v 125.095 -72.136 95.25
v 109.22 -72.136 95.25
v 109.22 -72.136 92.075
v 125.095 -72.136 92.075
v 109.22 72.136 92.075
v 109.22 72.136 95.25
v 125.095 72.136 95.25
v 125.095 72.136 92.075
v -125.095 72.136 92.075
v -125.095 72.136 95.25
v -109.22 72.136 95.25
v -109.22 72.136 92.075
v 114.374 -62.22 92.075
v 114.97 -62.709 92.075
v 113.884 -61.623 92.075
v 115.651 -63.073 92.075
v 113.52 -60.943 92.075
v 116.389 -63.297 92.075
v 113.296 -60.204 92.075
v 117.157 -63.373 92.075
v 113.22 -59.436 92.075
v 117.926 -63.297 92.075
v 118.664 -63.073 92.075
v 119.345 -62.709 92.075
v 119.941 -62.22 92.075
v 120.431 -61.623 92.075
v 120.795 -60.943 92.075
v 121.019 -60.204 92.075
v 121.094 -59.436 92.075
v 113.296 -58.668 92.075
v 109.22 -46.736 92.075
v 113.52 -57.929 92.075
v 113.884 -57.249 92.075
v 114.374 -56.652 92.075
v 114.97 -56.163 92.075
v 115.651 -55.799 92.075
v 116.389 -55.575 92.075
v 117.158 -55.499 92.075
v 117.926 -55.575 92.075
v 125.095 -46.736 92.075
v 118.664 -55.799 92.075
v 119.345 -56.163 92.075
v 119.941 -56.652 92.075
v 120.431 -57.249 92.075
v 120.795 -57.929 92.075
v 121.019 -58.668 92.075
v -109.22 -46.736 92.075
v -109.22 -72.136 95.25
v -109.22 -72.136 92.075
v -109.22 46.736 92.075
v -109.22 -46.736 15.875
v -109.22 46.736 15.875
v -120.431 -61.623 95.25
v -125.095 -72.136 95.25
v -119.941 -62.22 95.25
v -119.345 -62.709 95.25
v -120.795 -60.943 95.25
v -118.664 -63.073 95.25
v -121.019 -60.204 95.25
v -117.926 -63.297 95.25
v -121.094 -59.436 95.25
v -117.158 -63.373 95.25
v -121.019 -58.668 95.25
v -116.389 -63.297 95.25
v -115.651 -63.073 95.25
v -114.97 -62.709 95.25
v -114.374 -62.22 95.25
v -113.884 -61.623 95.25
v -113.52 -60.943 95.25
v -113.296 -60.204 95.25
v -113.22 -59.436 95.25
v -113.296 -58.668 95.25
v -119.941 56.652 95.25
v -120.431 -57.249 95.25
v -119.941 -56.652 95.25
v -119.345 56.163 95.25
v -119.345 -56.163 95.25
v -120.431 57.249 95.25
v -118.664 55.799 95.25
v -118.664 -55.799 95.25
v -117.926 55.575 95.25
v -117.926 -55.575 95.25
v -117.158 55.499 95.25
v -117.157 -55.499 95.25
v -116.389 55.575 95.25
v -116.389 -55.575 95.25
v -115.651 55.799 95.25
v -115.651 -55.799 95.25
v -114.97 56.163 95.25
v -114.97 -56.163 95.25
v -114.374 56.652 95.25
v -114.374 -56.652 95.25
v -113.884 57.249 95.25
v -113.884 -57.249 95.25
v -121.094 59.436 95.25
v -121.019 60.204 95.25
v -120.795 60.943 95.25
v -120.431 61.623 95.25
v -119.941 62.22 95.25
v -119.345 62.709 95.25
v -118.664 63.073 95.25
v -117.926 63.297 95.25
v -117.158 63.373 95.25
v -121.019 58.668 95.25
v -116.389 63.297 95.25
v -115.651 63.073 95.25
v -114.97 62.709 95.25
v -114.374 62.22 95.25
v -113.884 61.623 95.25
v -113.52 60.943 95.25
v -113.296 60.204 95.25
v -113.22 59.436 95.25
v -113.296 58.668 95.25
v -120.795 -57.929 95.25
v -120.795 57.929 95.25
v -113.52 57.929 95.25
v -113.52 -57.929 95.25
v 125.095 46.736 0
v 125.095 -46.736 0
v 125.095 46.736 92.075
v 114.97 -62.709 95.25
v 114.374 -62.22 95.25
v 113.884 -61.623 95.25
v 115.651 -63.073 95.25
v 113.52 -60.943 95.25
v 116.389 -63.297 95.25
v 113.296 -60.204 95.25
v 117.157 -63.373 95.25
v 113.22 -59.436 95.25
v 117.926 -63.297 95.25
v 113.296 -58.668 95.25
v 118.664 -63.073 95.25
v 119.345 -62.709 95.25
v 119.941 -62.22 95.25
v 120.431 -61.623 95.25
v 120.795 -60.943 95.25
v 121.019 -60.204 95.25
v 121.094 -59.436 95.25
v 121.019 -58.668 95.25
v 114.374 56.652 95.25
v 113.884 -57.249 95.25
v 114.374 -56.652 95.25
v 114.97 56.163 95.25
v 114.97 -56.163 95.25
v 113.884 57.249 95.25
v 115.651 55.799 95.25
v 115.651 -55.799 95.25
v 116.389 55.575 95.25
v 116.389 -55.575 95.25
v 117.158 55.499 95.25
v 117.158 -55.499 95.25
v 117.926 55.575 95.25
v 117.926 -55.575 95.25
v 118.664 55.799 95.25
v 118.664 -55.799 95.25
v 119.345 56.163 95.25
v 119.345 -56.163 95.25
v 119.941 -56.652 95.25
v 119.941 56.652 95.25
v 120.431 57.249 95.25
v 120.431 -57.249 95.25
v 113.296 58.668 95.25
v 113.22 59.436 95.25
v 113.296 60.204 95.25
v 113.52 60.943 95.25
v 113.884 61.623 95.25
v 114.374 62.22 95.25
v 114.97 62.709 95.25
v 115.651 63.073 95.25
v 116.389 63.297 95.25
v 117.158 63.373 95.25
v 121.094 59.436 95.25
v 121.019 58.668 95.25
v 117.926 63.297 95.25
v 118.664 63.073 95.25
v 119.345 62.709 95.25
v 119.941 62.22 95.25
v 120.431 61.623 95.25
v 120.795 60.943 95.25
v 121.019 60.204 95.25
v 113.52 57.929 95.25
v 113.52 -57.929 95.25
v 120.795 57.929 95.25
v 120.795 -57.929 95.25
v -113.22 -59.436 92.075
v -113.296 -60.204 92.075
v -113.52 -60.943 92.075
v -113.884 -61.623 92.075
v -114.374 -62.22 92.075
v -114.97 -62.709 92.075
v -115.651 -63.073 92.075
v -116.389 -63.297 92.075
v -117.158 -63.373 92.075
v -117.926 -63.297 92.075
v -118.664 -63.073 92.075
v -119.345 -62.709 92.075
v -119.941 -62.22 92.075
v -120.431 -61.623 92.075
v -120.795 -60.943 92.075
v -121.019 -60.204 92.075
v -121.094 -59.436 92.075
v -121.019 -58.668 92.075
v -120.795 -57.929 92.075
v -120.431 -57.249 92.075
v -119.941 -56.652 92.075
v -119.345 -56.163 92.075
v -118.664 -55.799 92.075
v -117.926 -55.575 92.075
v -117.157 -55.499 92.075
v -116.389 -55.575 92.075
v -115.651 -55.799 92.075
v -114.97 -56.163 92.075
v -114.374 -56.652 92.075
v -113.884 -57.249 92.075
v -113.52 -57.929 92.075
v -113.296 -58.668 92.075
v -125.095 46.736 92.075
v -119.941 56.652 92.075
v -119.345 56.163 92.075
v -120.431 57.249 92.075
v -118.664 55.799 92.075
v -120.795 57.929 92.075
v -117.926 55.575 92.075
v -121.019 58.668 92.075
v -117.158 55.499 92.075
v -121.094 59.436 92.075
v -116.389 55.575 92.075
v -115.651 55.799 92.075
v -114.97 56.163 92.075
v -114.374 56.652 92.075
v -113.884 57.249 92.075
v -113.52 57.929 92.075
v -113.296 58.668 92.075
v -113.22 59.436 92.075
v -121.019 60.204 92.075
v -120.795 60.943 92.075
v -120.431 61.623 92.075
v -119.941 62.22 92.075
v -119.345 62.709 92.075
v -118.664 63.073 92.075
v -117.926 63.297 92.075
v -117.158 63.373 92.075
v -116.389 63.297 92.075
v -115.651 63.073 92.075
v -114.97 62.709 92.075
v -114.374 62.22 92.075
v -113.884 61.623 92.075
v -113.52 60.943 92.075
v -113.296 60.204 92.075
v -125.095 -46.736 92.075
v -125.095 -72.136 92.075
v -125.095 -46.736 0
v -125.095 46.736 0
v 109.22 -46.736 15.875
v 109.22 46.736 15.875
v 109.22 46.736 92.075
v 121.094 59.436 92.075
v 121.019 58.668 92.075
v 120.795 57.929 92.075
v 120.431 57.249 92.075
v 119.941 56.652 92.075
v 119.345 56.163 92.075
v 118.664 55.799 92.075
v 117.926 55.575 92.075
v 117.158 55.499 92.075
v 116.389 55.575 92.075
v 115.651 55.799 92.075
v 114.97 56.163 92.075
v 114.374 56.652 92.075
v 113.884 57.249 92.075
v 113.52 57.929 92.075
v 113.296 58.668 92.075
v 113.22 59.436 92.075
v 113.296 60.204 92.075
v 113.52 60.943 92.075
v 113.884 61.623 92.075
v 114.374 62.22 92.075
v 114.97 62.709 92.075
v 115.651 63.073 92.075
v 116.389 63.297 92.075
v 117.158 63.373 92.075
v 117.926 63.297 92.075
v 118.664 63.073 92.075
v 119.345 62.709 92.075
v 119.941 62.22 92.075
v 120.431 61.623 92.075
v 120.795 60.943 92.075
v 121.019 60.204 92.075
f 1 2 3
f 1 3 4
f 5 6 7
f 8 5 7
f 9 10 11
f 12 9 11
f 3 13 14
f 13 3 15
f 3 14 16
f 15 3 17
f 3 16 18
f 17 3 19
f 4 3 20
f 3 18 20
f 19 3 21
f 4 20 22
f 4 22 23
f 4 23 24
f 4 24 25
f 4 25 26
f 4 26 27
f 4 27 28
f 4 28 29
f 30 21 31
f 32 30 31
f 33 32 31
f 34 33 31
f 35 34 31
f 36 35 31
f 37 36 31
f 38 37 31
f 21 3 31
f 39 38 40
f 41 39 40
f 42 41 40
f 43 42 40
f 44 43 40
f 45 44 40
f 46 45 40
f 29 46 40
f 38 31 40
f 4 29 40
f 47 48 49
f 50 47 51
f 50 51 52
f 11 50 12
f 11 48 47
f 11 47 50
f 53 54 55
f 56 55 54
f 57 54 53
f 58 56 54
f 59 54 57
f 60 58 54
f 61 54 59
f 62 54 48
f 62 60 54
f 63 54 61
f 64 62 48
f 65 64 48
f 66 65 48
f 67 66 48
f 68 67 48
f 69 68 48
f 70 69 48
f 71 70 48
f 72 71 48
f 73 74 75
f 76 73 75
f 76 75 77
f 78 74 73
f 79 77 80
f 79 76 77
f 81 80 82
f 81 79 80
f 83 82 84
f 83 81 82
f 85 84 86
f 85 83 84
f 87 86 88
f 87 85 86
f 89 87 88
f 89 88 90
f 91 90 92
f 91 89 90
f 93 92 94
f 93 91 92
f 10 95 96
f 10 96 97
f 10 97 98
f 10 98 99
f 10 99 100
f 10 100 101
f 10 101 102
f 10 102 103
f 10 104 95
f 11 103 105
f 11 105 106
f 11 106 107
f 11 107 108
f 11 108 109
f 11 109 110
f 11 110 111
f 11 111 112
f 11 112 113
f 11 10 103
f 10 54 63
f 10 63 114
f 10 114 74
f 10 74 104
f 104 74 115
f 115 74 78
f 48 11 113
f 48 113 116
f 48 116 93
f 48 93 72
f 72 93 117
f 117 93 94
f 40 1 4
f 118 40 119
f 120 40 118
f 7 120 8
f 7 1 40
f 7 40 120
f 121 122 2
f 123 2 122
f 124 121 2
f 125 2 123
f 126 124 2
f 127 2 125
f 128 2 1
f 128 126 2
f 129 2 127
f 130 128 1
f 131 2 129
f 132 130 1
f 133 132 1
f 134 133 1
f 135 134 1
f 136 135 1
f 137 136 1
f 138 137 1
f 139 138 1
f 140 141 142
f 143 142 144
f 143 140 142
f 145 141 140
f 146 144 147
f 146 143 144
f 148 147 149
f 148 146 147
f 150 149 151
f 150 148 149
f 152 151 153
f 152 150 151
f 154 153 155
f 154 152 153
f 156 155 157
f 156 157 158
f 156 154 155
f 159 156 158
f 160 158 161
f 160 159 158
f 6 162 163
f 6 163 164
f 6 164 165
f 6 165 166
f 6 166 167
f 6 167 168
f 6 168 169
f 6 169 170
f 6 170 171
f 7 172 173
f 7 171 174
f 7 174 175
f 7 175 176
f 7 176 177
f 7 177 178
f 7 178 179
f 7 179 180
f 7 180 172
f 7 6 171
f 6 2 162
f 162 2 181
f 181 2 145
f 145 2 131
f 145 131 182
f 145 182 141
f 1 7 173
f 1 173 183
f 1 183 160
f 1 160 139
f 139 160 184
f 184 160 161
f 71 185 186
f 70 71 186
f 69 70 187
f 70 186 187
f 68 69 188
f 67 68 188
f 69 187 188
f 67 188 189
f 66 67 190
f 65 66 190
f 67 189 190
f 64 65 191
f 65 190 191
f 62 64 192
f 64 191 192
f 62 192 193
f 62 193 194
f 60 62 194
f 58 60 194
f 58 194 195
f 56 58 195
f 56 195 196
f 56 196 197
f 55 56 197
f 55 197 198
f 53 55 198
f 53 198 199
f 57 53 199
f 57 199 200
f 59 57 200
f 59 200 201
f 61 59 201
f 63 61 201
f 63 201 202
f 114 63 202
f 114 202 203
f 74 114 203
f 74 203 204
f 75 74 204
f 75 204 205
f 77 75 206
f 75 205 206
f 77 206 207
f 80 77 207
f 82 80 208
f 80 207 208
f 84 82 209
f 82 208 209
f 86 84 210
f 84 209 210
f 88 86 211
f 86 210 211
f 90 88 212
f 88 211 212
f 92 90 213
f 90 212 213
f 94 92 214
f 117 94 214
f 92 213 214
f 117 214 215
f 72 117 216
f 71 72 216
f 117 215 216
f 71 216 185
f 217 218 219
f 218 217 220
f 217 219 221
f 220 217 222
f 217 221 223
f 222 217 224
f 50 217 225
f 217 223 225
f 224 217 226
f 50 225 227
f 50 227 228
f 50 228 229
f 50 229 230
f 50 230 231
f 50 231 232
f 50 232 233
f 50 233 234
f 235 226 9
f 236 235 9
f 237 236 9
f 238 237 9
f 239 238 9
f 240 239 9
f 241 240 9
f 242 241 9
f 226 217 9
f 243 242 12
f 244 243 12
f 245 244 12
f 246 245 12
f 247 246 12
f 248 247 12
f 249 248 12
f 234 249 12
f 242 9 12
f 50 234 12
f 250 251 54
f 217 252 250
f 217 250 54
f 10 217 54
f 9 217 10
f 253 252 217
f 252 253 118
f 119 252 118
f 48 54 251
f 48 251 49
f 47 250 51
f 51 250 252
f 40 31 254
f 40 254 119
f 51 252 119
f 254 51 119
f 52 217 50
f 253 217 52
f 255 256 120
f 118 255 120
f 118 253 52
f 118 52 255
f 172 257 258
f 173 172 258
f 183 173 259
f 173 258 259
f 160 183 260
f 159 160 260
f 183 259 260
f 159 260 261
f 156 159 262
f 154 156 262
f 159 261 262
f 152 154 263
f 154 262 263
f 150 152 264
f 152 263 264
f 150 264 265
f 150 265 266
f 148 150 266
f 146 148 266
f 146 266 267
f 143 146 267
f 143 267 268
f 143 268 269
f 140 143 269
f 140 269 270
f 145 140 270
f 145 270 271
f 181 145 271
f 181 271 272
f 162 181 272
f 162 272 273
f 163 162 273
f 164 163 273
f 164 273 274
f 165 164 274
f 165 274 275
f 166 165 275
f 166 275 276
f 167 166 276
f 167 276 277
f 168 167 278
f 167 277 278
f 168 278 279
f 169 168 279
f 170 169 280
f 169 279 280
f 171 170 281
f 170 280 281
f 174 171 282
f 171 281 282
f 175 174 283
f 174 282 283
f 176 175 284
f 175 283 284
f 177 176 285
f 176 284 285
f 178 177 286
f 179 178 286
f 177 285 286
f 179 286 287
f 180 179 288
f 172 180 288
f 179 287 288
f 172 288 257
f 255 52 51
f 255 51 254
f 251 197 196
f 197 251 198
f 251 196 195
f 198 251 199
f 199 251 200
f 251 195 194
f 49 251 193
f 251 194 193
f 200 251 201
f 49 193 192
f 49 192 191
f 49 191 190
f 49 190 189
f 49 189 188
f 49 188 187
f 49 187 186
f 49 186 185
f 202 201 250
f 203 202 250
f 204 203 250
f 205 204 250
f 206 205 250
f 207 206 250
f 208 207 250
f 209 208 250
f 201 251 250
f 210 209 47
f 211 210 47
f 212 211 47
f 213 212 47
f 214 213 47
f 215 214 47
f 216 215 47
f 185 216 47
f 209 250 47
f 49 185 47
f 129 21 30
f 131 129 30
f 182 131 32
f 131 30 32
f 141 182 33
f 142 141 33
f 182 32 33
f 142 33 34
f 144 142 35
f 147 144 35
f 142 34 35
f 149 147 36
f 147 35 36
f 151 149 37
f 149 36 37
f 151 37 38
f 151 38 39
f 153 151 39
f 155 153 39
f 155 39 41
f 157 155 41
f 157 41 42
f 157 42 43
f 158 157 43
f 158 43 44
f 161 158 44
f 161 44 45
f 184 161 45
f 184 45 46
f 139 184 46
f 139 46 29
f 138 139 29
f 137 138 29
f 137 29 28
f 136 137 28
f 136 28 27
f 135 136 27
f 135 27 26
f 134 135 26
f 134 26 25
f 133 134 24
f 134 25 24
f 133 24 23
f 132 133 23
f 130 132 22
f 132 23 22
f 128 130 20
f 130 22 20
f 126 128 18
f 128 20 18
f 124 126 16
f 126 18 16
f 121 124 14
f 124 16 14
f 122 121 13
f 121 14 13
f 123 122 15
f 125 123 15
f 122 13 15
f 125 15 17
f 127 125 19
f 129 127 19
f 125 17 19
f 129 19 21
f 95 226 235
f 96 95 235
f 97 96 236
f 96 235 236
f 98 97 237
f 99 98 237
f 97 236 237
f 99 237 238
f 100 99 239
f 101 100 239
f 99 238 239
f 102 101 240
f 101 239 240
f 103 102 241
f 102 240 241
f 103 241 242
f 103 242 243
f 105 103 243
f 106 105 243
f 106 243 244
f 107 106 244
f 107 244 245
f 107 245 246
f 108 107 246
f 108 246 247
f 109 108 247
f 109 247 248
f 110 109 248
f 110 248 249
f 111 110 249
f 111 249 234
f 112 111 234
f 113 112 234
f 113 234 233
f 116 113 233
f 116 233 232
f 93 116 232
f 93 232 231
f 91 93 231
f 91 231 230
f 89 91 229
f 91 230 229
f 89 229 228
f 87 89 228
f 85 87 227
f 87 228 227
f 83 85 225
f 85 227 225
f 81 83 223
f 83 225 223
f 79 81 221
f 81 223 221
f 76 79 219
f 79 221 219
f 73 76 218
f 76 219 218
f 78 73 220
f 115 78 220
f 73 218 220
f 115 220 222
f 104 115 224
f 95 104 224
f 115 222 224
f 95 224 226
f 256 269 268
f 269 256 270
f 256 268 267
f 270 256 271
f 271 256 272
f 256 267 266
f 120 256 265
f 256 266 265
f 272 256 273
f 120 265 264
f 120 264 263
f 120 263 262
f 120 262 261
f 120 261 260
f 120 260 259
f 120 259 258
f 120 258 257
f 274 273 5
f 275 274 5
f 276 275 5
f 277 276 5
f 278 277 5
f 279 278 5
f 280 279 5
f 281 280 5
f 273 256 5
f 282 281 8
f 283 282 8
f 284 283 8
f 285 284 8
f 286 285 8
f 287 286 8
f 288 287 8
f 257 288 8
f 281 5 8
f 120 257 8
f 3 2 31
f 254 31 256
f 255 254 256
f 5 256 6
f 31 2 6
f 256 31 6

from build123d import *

# Parameters (mm, degrees)
SKETCH1_W           = 250.19
SKETCH1_H           = 93.472
BOSS_EXTRUDE1_DEPTH = 95.25
SKETCH5_W           = 218.44
SKETCH5_H           = 93.472
CUT_EXTRUDE1_DEPTH  = 79.375
SKETCH6_W           = 15.875
SKETCH6_H           = 25.4
BOSS_EXTRUDE2_DEPTH = 3.175
SKETCH7_R           = 3.937
CUT_EXTRUDE2_DEPTH  = 172.26052419


with BuildPart() as part:
    # Sketch1 → Boss-Extrude1 (new body)
    with BuildSketch(Plane.XY):
        Rectangle(SKETCH1_W, SKETCH1_H)
    extrude(amount=BOSS_EXTRUDE1_DEPTH)

    # Sketch5 → Cut-Extrude1 (cut)
    with BuildSketch(Plane.XY.offset(95.25)):
        Rectangle(SKETCH5_W, SKETCH5_H)
    extrude(amount=-CUT_EXTRUDE1_DEPTH, mode=Mode.SUBTRACT)

    # Sketch6 → Boss-Extrude2 (add)
    with BuildSketch(Plane.XY.offset(95.25)):
        with Locations((117.1575, 59.436)):
            Rectangle(SKETCH6_W, SKETCH6_H)
        with Locations((-117.1575, 59.436)):
            Rectangle(SKETCH6_W, SKETCH6_H)
        with Locations((117.1575, -59.436)):
            Rectangle(SKETCH6_W, SKETCH6_H)
        with Locations((-117.1575, -59.436)):
            Rectangle(SKETCH6_W, SKETCH6_H)
    extrude(amount=-BOSS_EXTRUDE2_DEPTH)

    # Sketch7 → Cut-Extrude2 (cut, through all)
    with BuildSketch(Plane(origin=(0, 0, 92.075), x_dir=(-1, 0, 0), z_dir=(0, 0, -1))):
        with Locations((117.1575, 59.436)):
            Circle(SKETCH7_R)
        with Locations(Location((-117.1575, 59.436, 0), (0, 0, 180))):
            Circle(SKETCH7_R)
        with Locations(Location((117.1575, -59.436, 0), (0, 0, 180))):
            Circle(SKETCH7_R)
        with Locations((-117.1575, -59.436)):
            Circle(SKETCH7_R)
    extrude(amount=-CUT_EXTRUDE2_DEPTH, mode=Mode.SUBTRACT)


solid = part.part
